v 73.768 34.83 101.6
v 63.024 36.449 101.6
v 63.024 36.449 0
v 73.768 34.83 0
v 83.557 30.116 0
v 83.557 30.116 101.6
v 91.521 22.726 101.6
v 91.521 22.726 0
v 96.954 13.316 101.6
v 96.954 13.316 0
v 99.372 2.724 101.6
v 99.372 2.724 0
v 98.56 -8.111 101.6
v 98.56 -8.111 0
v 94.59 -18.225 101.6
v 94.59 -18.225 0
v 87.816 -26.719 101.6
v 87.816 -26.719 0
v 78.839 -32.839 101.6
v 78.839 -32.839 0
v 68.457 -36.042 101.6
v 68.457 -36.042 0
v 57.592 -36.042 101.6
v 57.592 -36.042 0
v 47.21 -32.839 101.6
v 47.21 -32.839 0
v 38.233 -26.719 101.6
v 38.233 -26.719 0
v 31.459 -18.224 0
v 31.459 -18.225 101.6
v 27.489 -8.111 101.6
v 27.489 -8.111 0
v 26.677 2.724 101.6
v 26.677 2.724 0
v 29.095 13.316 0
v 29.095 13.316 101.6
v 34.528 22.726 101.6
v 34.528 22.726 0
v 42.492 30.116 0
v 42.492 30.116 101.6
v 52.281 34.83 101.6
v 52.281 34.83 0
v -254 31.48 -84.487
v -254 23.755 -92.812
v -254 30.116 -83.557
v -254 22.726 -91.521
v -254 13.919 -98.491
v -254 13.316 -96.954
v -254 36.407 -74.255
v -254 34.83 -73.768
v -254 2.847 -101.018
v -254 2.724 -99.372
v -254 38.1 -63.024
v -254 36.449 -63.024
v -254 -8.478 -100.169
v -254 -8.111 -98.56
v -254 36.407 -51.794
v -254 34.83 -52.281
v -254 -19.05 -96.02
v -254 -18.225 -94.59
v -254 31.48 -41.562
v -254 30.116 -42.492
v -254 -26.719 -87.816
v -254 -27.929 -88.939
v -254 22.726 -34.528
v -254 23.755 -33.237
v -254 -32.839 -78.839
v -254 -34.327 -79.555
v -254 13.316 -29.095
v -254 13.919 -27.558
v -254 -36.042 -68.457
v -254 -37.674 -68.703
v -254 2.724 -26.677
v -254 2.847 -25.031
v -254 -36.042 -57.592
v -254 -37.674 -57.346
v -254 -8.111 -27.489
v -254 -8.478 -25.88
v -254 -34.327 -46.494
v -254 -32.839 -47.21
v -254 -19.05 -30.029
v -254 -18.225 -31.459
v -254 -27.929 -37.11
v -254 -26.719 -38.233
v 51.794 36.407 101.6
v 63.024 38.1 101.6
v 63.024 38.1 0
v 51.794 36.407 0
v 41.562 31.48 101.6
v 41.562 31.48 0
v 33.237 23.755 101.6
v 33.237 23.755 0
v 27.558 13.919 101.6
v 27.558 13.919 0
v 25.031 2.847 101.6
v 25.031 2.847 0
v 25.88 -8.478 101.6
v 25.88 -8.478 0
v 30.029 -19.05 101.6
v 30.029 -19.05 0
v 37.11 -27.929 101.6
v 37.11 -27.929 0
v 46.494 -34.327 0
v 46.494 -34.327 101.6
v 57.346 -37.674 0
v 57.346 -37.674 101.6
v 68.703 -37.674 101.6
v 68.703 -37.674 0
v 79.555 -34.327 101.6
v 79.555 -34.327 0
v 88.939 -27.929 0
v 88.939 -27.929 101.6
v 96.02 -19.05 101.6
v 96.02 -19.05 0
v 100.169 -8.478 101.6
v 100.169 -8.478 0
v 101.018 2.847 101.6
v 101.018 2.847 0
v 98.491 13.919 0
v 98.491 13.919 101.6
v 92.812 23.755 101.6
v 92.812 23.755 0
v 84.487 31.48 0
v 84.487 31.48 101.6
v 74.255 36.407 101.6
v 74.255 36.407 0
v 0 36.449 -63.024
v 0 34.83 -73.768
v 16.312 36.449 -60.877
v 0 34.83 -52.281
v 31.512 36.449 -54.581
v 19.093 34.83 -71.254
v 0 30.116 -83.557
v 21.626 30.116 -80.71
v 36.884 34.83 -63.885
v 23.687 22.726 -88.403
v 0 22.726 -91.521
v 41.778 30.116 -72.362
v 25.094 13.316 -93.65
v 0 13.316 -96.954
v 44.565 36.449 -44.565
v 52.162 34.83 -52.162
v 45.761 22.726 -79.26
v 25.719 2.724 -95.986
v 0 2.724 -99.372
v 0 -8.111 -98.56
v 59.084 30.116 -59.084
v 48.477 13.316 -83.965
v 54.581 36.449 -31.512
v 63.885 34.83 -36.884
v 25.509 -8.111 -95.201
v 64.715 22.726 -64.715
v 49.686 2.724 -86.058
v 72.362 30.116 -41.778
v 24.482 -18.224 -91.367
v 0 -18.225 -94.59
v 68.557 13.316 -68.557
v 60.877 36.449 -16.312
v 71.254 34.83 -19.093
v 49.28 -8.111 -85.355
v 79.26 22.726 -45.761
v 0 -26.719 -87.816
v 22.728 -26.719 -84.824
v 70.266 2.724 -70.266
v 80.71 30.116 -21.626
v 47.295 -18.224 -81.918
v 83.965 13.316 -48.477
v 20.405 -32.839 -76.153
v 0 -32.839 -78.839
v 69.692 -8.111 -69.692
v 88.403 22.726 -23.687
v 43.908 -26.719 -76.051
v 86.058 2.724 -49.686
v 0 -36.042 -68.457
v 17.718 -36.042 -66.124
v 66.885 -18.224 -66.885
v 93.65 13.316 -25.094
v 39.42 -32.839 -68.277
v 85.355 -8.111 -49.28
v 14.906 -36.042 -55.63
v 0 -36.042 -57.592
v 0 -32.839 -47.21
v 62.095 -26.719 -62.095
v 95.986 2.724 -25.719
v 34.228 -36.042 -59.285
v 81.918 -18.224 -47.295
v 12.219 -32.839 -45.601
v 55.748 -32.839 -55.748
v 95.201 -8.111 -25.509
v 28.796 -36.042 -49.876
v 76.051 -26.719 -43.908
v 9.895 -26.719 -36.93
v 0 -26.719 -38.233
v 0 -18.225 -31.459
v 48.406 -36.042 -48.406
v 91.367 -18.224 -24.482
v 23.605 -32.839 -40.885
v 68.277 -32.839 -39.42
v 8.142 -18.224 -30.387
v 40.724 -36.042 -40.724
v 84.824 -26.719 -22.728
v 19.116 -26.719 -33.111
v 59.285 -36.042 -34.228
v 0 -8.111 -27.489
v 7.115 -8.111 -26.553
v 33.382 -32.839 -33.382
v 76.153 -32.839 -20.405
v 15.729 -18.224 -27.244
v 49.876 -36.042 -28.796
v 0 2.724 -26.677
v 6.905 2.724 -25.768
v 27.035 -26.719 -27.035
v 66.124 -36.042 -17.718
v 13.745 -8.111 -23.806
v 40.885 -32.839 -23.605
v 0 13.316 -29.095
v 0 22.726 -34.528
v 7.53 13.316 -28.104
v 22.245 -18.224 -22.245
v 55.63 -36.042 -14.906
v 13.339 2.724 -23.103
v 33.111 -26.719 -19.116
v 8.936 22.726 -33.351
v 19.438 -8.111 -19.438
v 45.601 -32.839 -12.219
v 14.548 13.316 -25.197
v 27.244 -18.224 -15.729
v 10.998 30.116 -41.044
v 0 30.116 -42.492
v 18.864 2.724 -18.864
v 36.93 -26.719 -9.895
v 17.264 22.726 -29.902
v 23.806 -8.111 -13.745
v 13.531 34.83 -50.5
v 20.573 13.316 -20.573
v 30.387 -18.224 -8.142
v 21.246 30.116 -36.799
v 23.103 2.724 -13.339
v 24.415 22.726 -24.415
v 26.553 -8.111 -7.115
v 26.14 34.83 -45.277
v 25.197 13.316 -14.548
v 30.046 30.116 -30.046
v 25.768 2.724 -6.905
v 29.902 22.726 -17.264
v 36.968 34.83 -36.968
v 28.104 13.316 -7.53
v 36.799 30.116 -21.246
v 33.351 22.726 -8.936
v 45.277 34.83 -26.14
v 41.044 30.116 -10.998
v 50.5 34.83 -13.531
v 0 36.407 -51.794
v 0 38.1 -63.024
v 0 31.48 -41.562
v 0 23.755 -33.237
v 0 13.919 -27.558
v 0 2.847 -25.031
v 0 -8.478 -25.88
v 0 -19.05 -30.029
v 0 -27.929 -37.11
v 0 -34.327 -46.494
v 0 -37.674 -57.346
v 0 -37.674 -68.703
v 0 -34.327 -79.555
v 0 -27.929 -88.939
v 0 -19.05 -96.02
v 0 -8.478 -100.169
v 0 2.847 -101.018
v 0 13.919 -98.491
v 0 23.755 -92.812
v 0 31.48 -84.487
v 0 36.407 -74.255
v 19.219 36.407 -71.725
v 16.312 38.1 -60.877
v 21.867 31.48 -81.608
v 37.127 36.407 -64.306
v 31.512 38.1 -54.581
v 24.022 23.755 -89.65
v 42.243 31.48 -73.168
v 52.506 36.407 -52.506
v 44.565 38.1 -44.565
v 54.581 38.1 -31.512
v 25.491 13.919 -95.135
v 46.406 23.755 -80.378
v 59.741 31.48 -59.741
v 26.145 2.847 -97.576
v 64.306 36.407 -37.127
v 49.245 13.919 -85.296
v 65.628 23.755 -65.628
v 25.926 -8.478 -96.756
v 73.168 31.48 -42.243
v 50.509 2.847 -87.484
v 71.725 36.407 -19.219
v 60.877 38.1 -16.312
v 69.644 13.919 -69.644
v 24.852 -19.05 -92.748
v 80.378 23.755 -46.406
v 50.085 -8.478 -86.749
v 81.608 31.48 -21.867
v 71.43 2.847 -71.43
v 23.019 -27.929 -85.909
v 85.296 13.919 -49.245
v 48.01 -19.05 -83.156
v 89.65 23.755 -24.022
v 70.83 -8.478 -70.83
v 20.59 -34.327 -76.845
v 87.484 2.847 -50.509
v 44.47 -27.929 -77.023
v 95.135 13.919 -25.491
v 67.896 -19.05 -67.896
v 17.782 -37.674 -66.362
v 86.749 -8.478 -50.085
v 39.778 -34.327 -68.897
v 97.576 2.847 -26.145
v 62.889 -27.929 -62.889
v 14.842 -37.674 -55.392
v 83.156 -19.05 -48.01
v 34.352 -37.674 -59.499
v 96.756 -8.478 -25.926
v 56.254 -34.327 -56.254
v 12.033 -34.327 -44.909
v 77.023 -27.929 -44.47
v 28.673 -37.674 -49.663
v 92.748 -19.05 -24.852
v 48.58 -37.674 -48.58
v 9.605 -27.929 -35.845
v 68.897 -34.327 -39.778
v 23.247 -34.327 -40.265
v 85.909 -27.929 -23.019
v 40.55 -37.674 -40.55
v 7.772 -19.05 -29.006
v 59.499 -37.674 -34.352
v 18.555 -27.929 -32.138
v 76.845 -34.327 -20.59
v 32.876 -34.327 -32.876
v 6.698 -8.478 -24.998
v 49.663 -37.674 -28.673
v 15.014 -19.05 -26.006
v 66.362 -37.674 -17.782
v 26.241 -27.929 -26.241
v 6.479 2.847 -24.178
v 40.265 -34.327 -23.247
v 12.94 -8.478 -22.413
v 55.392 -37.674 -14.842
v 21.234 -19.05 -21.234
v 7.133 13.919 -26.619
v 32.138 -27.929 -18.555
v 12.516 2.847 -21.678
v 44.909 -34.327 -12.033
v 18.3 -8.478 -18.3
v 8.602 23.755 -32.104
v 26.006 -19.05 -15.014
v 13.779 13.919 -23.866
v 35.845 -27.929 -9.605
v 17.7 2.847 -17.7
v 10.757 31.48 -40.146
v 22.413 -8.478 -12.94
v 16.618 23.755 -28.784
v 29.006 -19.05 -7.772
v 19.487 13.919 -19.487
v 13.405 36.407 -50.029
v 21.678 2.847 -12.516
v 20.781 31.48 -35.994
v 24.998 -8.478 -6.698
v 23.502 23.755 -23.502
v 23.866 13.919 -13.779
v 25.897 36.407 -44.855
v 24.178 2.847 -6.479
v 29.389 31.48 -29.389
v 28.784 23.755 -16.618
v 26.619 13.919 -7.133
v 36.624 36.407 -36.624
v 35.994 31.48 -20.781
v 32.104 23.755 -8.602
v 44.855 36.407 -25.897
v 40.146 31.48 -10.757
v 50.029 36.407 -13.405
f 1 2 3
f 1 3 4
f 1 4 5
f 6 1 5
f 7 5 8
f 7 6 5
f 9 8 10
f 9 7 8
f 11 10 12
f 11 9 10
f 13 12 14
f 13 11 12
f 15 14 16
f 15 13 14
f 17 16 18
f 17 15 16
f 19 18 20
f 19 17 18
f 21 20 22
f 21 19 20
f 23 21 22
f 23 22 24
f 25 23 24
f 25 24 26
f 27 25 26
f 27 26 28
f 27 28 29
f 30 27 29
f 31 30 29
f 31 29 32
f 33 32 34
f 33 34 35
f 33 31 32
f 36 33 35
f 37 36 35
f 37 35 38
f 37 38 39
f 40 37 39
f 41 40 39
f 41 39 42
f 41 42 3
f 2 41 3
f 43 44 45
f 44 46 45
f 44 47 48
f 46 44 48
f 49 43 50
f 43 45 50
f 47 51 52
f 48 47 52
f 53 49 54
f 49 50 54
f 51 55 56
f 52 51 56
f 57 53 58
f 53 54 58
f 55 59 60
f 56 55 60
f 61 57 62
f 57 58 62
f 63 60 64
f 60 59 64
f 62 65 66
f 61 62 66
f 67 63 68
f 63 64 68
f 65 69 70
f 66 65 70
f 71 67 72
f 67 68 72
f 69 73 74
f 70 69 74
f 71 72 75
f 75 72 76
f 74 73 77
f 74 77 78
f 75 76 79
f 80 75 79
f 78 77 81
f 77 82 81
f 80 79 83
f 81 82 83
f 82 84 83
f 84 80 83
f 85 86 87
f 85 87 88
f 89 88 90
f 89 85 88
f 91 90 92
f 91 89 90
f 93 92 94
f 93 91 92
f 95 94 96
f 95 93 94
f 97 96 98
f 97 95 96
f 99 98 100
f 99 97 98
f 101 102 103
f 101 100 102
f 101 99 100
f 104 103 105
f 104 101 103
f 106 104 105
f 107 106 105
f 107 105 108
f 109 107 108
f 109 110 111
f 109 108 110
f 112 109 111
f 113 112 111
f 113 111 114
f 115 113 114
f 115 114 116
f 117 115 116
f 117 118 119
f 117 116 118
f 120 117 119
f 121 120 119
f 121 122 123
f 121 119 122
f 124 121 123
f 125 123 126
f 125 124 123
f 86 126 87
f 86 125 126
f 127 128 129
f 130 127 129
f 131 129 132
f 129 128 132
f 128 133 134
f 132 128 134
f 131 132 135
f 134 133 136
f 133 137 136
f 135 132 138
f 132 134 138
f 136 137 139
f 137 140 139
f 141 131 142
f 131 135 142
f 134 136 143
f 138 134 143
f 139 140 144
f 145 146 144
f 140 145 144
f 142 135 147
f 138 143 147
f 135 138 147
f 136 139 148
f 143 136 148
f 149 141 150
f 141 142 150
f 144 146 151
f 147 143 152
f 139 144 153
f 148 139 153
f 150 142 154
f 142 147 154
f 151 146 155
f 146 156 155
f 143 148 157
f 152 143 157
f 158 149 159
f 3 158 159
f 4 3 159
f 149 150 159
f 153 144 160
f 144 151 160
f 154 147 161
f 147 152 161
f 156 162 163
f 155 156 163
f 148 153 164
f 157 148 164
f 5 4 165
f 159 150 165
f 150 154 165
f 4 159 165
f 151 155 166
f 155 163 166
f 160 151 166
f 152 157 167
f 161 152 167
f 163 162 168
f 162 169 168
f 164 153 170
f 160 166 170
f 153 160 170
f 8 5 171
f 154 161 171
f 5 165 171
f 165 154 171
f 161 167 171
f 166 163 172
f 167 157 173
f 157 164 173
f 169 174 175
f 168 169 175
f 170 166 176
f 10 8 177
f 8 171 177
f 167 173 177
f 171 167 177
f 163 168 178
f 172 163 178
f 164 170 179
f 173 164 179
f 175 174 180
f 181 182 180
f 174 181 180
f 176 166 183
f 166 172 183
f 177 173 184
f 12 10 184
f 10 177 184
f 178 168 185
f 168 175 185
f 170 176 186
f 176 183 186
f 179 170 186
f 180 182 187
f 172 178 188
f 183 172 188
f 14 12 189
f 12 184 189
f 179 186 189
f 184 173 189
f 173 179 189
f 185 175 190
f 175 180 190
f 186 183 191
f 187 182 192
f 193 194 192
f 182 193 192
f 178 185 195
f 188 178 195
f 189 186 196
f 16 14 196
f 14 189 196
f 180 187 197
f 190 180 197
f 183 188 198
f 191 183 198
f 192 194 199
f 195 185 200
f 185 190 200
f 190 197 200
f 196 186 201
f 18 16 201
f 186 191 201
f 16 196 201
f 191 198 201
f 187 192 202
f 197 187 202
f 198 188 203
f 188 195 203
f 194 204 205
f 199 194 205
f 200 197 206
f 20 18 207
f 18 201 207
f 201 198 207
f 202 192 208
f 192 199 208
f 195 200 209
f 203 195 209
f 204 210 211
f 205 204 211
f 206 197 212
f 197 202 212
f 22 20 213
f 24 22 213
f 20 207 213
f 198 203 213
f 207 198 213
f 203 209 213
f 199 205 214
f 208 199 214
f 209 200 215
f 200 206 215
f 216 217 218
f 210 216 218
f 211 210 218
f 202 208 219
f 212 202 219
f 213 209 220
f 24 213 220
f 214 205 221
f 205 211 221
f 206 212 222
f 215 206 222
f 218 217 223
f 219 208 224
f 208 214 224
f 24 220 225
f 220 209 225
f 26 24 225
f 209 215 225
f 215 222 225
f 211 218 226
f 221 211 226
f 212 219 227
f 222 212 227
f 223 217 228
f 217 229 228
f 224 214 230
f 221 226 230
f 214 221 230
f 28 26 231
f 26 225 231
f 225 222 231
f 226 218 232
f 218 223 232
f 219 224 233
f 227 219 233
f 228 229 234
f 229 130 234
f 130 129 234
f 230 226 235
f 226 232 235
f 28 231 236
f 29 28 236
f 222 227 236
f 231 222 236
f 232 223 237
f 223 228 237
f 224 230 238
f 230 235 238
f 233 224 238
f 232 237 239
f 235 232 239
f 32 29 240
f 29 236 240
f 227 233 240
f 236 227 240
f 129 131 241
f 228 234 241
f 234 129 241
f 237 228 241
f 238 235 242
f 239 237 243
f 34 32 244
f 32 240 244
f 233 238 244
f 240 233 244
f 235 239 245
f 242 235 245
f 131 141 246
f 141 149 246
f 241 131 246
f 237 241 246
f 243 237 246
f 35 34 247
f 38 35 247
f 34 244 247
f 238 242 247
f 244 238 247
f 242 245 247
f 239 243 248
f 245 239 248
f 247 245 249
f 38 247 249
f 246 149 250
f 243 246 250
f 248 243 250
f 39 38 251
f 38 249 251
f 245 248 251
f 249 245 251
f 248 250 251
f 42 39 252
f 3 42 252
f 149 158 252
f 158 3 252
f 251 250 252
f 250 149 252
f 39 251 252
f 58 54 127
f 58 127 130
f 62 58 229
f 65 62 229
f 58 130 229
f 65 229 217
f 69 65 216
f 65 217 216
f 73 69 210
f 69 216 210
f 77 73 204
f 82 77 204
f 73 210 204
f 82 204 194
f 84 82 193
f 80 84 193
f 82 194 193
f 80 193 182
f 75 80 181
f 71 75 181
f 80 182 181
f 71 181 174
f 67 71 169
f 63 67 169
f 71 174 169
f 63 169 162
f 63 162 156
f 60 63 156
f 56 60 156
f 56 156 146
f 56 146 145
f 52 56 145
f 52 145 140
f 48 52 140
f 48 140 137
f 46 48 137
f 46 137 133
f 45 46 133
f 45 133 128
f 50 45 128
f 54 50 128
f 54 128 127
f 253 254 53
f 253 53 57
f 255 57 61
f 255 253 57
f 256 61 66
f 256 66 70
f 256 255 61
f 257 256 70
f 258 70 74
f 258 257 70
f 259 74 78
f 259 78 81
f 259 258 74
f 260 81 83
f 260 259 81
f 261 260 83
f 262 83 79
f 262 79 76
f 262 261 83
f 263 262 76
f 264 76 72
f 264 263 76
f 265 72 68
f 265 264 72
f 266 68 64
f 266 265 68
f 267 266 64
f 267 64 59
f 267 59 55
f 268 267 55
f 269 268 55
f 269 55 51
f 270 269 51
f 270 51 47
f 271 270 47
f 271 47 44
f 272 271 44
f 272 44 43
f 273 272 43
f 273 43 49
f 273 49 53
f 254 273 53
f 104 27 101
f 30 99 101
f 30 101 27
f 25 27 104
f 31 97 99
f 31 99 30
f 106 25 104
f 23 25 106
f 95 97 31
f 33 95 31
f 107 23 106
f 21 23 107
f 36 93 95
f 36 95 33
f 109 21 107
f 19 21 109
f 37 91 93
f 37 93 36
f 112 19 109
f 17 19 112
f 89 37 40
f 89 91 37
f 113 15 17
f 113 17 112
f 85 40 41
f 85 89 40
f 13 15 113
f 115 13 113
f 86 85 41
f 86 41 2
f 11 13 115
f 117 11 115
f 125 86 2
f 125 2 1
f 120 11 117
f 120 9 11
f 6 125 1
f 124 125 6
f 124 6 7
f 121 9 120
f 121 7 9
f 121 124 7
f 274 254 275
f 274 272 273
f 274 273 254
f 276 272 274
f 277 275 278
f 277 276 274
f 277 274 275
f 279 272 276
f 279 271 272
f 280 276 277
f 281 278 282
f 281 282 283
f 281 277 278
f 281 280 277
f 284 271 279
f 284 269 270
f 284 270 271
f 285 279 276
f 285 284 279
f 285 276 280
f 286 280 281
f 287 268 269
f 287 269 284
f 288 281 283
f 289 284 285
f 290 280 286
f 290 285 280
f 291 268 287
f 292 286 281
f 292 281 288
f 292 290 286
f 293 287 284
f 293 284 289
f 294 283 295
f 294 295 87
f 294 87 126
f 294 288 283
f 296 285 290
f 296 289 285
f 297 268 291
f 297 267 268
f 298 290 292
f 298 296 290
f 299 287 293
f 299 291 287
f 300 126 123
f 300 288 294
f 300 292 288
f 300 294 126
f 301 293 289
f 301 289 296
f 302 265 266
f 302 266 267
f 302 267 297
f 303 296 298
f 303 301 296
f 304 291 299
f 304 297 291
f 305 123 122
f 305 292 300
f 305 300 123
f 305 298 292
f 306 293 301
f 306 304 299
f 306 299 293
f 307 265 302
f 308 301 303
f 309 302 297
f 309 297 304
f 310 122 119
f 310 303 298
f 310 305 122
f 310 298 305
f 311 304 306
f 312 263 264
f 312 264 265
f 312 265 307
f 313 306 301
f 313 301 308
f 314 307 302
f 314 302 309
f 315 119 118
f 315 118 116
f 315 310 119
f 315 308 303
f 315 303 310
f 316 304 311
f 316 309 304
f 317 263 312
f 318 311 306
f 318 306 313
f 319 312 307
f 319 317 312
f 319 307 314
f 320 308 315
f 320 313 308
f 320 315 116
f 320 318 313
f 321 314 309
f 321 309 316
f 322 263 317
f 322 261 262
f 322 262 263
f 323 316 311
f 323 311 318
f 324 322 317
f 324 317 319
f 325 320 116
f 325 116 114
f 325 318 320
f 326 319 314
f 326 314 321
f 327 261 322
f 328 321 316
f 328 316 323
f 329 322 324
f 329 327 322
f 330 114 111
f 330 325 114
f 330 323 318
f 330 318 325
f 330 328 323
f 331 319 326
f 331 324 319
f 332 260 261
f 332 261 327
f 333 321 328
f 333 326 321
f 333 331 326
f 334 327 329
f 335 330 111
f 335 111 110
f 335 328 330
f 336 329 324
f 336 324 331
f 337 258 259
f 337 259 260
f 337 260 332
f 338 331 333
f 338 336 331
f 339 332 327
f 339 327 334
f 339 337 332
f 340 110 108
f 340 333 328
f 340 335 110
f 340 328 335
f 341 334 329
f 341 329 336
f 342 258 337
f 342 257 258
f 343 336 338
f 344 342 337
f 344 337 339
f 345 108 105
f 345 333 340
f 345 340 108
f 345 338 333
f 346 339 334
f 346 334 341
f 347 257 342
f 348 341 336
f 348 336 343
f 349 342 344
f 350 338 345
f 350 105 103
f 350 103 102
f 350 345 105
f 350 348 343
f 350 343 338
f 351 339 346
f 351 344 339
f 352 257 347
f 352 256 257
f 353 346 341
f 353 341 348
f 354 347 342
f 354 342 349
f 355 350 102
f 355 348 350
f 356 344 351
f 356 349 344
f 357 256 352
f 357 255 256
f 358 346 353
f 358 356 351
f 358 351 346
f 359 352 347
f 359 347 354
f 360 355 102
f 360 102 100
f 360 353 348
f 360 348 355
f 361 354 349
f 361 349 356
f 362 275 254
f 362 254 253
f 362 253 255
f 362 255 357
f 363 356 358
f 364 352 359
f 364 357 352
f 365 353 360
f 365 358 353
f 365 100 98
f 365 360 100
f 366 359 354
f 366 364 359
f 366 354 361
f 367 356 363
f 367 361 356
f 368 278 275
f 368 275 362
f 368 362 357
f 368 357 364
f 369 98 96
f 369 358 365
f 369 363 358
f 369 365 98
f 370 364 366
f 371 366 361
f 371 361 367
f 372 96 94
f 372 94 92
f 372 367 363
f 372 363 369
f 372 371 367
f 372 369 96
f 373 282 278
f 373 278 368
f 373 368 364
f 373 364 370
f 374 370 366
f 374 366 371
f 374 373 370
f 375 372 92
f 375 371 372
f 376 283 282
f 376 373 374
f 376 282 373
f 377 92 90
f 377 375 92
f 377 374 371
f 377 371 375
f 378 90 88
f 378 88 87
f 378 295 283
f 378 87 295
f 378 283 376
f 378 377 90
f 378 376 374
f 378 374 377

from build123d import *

# Parameters (mm, degrees)
F1_R   = 38.1
F1_R_2 = 36.449


with BuildPart() as f2:
    # F2: sweep along a path in F0
    with BuildLine(Plane.XZ) as f2_path:
        Line((-254, -63.5), (0, -63.5))
        ThreePointArc((0, -63.5), (44.901281, -44.901281), (63.5, 0))
        Line((63.5, 0), (63.5, 101.6))
    # F1 (on Right) → F2 (sweep)
    with BuildSketch(Plane.YZ):
        with Locations((0, -63.024494)):
            Circle(F1_R)
        with Locations((0, -63.024494)):
            Circle(F1_R_2, mode=Mode.SUBTRACT)
    sweep(path=f2_path.line)


solid = f2.part
